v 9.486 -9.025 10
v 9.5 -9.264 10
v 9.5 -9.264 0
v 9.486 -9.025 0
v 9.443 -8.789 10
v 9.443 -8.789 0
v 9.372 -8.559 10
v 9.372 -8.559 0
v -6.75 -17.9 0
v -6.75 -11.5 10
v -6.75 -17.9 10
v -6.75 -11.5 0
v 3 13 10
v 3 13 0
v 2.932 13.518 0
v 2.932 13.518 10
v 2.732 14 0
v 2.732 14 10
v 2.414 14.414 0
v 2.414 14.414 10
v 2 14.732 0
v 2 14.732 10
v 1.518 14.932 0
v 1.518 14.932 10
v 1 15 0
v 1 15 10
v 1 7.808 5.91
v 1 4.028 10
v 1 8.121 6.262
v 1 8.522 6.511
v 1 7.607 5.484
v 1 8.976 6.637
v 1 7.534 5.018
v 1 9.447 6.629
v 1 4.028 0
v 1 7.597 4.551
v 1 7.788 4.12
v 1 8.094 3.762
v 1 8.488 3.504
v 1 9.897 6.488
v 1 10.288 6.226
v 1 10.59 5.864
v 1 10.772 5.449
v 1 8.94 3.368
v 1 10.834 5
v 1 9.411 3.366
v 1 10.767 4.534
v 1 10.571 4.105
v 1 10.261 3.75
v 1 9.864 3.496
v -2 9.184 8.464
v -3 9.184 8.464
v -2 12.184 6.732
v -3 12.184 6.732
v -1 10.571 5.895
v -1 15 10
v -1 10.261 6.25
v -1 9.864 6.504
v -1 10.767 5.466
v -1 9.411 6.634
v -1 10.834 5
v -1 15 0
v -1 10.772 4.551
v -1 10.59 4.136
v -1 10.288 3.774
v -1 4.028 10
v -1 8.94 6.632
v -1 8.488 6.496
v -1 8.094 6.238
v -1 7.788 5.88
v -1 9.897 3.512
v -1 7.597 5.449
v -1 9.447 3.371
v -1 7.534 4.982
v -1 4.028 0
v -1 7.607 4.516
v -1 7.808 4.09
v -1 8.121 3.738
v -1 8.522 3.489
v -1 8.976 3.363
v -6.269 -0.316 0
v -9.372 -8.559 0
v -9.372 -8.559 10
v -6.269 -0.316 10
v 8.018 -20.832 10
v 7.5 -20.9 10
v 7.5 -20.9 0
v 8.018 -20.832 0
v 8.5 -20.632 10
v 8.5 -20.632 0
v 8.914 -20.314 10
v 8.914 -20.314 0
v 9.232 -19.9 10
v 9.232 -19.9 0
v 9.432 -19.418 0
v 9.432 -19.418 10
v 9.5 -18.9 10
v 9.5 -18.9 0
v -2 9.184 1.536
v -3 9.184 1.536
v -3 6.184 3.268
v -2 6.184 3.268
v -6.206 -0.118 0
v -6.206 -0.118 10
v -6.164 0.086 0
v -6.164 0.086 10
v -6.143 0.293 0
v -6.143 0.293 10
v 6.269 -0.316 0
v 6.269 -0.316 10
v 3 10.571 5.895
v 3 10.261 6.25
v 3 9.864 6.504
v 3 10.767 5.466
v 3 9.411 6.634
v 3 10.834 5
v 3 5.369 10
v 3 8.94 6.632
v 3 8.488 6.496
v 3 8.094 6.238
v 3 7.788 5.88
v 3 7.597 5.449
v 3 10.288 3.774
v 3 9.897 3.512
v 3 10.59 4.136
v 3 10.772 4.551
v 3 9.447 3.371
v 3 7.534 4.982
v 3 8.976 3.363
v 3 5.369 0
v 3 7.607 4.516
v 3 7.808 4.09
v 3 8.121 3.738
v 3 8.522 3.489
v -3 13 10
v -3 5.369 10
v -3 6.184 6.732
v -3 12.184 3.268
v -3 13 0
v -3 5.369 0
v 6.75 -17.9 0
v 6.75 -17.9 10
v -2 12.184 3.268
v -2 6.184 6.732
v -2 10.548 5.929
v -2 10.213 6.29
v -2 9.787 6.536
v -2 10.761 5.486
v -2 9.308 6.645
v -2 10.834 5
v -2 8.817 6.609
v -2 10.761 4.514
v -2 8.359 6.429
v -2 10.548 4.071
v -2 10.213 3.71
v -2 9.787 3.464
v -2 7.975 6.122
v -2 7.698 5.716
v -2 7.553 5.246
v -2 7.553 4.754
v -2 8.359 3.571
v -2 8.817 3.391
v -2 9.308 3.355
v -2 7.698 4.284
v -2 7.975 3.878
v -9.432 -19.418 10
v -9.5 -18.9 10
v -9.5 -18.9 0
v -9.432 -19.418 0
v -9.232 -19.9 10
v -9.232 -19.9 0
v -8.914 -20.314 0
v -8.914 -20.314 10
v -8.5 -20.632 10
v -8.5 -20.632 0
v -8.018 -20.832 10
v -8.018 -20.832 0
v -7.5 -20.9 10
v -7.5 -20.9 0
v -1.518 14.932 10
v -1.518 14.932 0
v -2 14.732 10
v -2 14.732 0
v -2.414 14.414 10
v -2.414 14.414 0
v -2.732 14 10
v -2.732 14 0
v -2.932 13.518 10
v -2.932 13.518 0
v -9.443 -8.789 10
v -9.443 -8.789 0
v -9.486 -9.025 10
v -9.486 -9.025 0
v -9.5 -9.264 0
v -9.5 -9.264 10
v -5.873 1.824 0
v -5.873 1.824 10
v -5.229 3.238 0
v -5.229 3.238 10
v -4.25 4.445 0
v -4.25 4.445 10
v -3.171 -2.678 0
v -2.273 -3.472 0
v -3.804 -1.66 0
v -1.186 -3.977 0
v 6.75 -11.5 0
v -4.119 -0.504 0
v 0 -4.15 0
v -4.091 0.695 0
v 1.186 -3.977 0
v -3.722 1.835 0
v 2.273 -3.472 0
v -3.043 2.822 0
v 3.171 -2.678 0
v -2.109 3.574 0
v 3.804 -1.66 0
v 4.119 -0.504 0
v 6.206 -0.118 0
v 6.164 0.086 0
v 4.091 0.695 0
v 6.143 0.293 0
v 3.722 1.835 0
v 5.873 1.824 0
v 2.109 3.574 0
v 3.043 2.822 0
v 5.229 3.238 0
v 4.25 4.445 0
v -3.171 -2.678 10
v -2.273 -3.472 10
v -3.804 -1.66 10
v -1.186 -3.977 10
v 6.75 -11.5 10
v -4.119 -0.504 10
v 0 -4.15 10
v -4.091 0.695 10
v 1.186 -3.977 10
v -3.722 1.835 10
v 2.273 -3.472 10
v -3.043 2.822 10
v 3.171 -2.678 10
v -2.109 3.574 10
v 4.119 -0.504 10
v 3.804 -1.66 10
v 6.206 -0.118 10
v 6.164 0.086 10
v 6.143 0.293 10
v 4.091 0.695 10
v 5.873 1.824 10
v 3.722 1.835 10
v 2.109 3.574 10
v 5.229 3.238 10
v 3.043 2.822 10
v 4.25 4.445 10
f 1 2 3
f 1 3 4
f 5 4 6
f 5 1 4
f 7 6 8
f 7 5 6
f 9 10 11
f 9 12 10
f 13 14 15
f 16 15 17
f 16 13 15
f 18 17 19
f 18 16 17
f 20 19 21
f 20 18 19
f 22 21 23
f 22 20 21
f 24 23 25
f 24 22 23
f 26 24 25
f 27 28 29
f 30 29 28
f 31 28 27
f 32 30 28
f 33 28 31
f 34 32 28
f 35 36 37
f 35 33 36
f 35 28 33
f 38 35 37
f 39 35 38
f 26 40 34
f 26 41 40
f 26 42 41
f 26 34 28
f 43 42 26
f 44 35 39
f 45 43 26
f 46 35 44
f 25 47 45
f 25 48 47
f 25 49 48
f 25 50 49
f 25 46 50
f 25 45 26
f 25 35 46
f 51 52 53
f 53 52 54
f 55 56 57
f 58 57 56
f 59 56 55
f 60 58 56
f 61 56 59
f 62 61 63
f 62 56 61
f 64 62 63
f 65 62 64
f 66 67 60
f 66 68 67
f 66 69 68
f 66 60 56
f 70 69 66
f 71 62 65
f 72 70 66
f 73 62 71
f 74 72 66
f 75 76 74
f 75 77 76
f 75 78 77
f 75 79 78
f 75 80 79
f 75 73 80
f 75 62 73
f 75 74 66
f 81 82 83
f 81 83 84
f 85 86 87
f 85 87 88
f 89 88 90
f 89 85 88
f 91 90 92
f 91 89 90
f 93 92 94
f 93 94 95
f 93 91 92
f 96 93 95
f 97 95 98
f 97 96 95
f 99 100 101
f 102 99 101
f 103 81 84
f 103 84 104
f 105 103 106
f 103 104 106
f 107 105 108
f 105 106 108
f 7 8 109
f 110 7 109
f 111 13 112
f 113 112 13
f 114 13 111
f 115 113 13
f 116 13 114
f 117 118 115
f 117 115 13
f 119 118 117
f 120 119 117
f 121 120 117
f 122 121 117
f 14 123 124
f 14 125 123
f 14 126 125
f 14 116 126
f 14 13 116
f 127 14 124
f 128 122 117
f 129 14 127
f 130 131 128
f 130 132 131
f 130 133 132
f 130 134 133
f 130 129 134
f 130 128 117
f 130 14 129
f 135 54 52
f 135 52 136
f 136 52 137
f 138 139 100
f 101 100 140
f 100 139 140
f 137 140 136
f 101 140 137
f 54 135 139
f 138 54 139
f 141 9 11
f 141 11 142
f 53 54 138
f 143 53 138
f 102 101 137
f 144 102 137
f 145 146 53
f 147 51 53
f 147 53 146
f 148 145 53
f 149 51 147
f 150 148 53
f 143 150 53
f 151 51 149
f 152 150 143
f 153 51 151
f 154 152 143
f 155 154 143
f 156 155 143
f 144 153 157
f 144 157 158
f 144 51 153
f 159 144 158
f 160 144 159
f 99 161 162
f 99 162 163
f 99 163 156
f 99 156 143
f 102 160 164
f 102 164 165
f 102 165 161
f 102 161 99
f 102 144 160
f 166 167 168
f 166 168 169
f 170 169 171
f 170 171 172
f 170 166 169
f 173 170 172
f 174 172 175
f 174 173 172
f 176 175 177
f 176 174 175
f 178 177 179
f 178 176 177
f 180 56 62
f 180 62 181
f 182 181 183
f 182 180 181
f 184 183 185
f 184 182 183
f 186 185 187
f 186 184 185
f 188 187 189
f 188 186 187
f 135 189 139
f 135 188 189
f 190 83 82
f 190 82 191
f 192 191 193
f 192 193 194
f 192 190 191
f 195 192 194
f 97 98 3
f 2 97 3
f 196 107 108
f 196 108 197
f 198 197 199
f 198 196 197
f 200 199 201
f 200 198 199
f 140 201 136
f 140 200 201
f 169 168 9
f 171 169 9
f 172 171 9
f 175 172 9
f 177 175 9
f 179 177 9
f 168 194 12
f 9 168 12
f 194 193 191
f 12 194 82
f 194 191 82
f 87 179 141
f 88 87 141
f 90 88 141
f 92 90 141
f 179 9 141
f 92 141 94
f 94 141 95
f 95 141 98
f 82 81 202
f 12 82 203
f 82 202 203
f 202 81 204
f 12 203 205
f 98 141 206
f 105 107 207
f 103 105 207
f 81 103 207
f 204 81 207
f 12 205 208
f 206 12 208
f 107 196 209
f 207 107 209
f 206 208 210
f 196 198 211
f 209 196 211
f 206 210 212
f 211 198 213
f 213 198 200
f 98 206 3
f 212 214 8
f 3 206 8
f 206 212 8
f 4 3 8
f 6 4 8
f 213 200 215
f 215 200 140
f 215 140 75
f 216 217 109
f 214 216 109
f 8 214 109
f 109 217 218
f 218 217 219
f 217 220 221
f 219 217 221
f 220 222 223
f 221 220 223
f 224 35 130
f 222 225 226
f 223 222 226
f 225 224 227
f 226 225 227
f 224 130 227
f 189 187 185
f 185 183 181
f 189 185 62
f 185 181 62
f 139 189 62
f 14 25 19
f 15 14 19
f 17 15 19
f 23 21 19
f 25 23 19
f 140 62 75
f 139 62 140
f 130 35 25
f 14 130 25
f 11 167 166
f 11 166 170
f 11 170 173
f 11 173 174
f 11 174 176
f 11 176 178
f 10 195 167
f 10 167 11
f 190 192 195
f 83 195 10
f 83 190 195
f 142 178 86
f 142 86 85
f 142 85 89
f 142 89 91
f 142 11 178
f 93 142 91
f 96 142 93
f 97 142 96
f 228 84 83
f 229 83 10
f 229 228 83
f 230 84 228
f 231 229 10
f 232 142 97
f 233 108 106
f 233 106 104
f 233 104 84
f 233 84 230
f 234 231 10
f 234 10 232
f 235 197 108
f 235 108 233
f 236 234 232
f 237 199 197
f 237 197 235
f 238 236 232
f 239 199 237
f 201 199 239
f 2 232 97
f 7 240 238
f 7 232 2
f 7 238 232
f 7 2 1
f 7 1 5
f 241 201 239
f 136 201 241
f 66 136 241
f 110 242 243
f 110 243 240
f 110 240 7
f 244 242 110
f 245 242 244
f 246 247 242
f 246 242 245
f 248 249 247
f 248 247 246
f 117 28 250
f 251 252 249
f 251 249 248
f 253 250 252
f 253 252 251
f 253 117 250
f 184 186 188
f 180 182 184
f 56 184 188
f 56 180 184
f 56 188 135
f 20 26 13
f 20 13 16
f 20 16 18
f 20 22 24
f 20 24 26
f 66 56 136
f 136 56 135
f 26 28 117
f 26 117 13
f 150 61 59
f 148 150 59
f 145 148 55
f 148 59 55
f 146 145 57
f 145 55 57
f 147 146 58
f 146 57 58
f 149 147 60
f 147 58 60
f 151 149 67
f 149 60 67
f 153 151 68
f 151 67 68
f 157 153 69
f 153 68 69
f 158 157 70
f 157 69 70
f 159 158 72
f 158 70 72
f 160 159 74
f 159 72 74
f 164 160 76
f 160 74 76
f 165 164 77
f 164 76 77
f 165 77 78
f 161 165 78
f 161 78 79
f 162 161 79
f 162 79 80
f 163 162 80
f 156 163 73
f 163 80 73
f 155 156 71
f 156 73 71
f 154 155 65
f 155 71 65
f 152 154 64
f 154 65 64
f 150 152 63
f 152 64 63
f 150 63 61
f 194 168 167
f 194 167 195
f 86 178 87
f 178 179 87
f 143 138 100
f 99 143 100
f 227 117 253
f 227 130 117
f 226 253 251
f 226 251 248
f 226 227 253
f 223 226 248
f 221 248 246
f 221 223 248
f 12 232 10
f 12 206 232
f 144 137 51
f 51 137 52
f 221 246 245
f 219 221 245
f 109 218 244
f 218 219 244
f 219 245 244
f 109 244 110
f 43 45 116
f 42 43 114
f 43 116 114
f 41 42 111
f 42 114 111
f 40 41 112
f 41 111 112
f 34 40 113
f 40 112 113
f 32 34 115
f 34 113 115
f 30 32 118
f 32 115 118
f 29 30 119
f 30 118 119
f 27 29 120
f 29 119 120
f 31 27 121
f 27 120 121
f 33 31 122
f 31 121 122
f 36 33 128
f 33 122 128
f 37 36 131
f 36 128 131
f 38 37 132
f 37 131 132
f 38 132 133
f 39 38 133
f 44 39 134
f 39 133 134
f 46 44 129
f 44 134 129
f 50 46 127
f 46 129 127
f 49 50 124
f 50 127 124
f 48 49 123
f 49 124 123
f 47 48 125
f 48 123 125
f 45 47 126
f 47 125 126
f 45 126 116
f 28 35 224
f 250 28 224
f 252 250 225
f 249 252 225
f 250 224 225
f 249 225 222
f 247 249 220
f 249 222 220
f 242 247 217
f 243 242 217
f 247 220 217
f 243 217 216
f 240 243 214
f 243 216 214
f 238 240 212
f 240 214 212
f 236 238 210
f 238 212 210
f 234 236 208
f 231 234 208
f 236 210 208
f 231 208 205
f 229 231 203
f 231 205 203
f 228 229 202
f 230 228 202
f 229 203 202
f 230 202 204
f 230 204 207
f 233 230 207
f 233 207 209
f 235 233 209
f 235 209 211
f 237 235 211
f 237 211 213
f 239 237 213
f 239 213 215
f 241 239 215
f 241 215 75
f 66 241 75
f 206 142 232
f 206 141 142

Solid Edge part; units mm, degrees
sketch "Sketch1" plane through (0, 0, 0) normal (0, 0, 1) x (1, 0, 0)
  line L0 (6.75, -11.5) -> (-6.75, -11.5)
  line L1 (-6.75, -11.5) -> (-6.75, -17.9)
  line L2 (-6.75, -17.9) -> (6.75, -17.9)
  line L3 (6.75, -17.9) -> (6.75, -11.5)
  line L4 (0, -20.9) -> (9.5, -20.9)
  line L5 (9.5, -20.9) -> (9.5, -8.9)
  line L6 (9.5, -8.9) -> (6.15, 0)
  arc A0 (3, 5.3687) -> (6.15, 0) centre (0, 0) cw
  line L7 (3, 15) -> (3, 5.3687)
  line L8 (1, 15) -> (3, 15)
  line L9 (1, 4.0277) -> (1, 15)
  line L10 (-1, 15) -> (-1, 4.0277)
  line L11 (-1, 15) -> (-3, 15)
  line L12 (-3, 15) -> (-3, 5.3687)
  line L13 (-9.5, -8.9) -> (-6.15, 0)
  line L14 (-9.5, -20.9) -> (-9.5, -8.9)
  line L15 (0, -20.9) -> (-9.5, -20.9)
  arc A1 (1, 4.0277) -> (-1, 4.0277) centre (0, 0) cw
  arc A2 (-3, 5.3687) -> (-6.15, 0) centre (0, 0) ccw
extrude "Protrusion1" add sketch "Sketch1" along normal blind 10
fillet "Round_1" radius 2 8 edges at (-9.5, -20.9, 5) (9.5, -20.9, 5) (9.5, -8.9, 5) (-9.5, -8.9, 5) (6.15, 0, 5) (-6.15, 0, 5) (-3, 15, 5) (3, 15, 5)
sketch "Sketch2" plane through (3, 9.1843, 5) normal (1, 0, 0) x (0, 1, 0)
  circle A0 centre (0, 0) radius 1.65
extrude "ExtrudedCutout_1" cut sketch "Sketch2" against normal blind 6
sketch "Sketch3" plane through (-3, 9.1843, 5) normal (-1, 0, 0) x (0, -1, 0)
  line L0 (3, 1.7321) -> (0, 3.4641)
  line L1 (0, 3.4641) -> (-3, 1.7321)
  line L2 (-3, 1.7321) -> (-3, -1.7321)
  line L3 (-3, -1.7321) -> (0, -3.4641)
  line L4 (0, -3.4641) -> (3, -1.7321)
  line L5 (3, -1.7321) -> (3, 1.7321)
extrude "ExtrudedCutout_2" cut sketch "Sketch3" against normal blind 1
